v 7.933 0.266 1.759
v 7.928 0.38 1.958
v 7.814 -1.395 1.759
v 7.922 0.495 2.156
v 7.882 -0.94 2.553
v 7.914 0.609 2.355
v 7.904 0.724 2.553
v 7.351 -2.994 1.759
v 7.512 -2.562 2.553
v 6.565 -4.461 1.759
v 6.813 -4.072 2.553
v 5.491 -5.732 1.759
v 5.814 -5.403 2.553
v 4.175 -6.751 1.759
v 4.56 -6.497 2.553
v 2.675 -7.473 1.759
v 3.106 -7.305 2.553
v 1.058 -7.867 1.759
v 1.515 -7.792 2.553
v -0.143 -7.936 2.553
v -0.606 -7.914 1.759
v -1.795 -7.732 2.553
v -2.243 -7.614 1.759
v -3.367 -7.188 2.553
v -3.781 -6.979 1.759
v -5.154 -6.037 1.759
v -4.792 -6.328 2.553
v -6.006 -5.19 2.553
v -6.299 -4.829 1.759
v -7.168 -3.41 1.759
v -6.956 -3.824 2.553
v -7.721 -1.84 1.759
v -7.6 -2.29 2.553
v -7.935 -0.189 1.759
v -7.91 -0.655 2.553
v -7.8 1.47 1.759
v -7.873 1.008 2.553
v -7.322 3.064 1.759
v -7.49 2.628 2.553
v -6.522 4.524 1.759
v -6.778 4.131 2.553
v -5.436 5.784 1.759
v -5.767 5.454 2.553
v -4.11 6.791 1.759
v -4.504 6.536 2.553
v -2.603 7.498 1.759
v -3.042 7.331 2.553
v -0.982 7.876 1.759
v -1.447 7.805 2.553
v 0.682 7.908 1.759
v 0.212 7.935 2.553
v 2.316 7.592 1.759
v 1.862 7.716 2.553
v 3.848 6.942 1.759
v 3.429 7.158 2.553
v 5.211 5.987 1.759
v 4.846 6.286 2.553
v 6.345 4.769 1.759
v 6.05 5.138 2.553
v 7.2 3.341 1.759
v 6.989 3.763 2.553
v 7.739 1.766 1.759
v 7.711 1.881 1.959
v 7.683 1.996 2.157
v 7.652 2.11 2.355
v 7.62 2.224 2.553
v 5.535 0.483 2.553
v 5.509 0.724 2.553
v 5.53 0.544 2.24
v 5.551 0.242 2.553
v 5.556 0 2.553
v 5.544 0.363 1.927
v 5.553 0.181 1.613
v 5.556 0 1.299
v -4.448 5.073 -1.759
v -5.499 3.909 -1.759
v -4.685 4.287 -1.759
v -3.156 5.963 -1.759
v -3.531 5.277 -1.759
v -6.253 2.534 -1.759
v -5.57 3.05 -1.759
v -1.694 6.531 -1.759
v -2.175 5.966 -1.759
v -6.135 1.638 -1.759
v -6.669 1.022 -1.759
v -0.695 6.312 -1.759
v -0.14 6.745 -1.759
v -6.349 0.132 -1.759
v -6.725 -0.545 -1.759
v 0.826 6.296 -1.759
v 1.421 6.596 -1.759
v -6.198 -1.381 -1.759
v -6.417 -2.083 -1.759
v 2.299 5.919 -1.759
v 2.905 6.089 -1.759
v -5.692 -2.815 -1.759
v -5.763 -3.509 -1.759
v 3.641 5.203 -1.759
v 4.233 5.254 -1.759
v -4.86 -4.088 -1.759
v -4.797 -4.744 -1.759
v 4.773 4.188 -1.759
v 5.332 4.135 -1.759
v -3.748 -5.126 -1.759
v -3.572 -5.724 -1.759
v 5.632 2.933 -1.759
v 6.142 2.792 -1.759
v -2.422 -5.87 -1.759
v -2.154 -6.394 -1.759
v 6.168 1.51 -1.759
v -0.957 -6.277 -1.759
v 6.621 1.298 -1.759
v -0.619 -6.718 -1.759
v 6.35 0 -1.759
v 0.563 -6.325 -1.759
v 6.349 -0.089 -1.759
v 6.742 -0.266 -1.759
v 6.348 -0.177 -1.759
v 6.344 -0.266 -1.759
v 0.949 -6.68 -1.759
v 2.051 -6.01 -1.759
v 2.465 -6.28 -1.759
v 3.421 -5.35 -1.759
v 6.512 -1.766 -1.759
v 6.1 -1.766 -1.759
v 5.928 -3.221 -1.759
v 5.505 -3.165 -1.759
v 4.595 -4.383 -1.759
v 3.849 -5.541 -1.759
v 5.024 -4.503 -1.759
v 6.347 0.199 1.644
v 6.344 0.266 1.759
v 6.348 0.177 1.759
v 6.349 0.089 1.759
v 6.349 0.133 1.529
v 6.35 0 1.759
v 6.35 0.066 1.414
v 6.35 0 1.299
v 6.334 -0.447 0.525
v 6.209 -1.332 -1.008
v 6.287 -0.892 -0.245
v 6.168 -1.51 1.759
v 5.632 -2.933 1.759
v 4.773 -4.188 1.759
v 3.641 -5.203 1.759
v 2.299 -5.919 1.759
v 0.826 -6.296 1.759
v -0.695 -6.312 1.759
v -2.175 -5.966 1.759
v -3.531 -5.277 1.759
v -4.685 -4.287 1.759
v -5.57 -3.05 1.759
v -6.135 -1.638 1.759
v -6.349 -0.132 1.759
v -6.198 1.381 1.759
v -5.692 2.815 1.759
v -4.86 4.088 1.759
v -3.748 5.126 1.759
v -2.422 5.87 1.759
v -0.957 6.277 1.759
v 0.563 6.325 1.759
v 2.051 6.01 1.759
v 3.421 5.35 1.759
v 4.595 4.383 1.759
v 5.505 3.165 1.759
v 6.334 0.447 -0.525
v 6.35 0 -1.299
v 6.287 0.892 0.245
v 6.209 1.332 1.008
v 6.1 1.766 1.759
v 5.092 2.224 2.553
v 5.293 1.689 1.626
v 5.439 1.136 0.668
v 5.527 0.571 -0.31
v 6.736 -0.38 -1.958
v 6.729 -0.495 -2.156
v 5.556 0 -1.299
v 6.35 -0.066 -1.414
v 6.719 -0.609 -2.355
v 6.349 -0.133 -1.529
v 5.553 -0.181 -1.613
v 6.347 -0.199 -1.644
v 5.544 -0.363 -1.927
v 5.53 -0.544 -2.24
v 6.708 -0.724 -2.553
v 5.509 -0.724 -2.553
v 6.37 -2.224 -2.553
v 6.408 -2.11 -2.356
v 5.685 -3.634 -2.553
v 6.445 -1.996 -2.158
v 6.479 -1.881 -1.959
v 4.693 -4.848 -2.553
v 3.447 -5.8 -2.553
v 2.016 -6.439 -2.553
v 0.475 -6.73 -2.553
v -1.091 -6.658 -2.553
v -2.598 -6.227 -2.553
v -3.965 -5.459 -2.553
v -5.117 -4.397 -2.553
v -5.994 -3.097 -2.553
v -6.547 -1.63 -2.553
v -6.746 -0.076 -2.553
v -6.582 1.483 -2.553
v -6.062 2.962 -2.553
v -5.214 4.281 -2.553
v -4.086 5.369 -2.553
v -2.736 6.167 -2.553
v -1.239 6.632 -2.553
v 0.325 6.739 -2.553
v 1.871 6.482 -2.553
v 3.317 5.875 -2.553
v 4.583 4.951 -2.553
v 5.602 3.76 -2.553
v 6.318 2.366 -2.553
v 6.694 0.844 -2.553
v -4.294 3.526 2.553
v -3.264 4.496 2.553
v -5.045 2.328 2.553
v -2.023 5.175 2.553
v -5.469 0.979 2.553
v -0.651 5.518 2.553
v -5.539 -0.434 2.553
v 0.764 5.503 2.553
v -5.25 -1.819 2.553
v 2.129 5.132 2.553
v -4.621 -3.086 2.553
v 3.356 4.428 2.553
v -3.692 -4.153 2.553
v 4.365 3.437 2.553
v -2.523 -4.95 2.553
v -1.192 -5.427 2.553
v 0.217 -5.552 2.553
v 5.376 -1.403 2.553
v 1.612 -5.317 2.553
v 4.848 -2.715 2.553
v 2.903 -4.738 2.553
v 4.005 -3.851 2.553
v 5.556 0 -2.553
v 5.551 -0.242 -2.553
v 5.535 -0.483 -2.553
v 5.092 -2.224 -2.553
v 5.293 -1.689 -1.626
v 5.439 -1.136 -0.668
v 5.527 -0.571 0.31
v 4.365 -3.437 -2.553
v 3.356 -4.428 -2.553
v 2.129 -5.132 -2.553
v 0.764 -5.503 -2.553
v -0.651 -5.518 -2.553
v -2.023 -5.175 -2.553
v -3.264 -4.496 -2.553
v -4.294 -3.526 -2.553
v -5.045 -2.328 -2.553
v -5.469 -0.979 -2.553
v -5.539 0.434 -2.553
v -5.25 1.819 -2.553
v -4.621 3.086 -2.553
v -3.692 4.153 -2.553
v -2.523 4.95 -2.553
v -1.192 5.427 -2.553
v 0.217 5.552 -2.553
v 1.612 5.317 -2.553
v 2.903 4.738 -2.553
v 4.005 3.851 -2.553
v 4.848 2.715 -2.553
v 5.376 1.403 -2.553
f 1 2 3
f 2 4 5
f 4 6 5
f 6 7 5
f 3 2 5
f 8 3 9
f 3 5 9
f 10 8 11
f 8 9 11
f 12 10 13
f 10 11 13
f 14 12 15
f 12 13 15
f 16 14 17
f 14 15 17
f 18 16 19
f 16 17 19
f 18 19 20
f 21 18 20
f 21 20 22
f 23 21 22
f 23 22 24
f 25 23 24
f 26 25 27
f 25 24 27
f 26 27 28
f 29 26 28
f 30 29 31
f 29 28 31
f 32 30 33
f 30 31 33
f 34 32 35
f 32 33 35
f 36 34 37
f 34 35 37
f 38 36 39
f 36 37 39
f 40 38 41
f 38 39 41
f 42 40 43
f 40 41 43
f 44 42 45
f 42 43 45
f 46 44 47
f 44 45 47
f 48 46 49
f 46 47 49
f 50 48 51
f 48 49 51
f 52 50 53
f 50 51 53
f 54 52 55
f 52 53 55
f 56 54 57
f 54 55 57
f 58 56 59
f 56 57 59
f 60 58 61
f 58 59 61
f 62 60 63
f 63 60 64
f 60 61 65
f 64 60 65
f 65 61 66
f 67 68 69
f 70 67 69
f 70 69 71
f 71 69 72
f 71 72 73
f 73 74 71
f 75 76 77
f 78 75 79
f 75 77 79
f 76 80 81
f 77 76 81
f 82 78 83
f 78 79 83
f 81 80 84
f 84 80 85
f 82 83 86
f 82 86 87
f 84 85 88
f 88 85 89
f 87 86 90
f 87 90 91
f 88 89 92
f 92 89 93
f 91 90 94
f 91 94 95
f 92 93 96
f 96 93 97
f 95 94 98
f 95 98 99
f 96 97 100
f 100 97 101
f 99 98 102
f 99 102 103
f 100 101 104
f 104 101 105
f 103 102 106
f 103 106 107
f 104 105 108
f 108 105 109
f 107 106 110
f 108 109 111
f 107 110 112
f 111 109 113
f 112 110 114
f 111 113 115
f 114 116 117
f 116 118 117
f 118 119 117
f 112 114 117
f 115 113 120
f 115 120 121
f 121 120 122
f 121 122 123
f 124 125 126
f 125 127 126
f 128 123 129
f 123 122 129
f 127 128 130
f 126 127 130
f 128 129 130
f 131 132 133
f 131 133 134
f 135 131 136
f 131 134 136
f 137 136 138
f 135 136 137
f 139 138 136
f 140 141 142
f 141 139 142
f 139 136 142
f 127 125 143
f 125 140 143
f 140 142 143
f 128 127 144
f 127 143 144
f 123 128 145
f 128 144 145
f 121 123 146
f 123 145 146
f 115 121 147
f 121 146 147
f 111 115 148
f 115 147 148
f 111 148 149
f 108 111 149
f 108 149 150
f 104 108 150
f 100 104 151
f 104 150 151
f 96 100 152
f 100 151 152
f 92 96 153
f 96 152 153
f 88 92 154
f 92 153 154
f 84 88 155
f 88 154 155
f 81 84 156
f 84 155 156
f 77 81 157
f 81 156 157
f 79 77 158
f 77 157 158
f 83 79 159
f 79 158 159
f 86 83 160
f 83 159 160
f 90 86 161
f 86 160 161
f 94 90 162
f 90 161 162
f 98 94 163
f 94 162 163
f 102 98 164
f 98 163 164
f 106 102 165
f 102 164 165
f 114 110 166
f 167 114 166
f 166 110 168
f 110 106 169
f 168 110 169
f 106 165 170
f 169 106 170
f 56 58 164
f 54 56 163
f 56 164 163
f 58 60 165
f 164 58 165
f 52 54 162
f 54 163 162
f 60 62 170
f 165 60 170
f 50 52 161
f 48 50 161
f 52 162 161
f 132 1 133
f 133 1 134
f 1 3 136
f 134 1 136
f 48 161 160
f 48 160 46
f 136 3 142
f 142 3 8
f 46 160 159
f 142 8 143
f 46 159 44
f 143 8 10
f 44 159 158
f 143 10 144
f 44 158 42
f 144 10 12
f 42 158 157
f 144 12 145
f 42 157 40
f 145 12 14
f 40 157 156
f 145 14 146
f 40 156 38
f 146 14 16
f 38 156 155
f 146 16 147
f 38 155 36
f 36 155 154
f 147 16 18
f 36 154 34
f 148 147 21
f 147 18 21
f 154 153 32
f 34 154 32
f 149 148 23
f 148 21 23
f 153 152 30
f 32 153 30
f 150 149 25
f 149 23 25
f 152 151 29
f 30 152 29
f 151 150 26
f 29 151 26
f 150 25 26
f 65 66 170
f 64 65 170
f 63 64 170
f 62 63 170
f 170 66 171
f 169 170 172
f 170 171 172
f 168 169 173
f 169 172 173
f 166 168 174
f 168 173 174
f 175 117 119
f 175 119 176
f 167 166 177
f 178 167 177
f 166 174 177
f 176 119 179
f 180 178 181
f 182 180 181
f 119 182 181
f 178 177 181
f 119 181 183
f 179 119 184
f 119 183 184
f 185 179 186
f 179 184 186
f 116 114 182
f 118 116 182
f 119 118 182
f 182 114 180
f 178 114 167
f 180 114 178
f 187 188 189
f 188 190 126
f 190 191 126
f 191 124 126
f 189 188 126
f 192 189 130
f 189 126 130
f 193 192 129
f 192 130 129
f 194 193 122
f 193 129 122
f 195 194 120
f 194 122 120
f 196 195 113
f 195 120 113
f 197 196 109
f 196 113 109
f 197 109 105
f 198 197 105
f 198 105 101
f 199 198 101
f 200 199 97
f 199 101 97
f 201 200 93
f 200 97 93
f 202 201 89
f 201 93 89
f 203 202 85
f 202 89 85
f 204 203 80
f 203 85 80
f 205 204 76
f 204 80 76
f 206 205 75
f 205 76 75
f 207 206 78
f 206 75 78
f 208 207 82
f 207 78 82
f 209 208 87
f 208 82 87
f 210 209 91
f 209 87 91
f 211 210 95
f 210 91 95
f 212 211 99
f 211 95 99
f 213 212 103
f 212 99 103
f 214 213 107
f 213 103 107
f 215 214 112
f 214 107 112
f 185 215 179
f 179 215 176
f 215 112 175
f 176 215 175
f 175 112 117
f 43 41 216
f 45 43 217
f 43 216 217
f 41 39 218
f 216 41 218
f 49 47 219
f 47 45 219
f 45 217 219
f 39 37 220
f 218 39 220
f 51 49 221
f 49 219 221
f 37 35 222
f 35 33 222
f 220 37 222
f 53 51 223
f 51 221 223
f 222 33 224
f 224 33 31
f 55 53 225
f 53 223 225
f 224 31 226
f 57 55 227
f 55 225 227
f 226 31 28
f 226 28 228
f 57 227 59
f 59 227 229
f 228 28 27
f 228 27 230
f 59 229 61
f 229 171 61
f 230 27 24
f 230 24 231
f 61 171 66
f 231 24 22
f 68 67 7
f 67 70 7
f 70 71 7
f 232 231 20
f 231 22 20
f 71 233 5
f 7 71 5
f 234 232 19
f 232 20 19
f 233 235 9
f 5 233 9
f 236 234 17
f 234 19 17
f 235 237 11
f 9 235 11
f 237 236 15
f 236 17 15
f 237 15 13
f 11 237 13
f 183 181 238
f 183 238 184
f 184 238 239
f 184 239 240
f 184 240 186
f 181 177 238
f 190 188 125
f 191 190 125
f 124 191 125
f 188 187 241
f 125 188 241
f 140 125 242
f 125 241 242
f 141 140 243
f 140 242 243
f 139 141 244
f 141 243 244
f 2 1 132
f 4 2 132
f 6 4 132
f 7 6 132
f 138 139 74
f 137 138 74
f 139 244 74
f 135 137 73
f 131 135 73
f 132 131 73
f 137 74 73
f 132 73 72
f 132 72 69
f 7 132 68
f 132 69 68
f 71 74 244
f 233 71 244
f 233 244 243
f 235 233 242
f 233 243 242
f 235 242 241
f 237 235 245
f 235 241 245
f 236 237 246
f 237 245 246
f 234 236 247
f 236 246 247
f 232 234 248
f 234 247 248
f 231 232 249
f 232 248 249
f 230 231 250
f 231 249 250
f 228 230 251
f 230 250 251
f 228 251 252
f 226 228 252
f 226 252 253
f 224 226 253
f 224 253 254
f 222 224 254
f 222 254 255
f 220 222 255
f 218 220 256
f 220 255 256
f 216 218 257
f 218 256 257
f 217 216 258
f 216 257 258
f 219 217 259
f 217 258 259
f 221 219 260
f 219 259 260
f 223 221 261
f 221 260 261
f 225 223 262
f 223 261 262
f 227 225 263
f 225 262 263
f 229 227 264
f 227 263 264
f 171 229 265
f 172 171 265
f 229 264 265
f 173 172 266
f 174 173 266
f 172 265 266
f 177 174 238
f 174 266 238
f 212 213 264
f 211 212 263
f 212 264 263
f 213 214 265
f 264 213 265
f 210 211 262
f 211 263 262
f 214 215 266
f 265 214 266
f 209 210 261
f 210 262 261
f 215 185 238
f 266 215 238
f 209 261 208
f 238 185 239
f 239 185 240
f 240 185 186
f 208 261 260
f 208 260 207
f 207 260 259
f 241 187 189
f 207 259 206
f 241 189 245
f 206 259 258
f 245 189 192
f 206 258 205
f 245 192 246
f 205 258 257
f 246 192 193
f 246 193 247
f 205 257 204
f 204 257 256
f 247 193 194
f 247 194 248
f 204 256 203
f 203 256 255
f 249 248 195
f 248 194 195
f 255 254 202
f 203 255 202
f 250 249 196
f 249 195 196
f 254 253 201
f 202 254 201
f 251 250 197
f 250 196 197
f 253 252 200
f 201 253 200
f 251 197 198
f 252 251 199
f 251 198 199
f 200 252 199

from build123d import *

# Parameters (mm, degrees)
CUT_EXTRUDE1_DEPTH = 12.511910779


with BuildPart() as part:
    # Sketch1 → Revolve1 (revolve)
    with BuildSketch(Plane(origin=(0, 0, 0), x_dir=(0, 0, -1), z_dir=(1, 0, 0)), mode=Mode.PRIVATE) as revolve1_sk:
        Polygon((-2.5527, 5.55625), (2.5527, 5.55625), (2.5527, 6.746875), (1.75895, 6.746875), (1.75895, 6.35), (-1.75895, 6.35), (-1.75895, 7.9375), (-2.5527, 7.9375), align=None)
    revolve(revolve1_sk.sketch.rotate(Axis((0, 0, 22.513636364), (0, 0, -1)), 90), axis=Axis((0, 0, 22.513636364), (0, 0, -1)))

    # Sketch2 → Cut-Extrude1 (cut, through all)
    with BuildSketch(Plane(origin=(0, 0, 0), x_dir=(0, 0, -1), z_dir=(1, 0, 0))):
        Polygon((-2.5527, 0.723802032), (-2.5527, 2.223802032), (2.5527, -0.723802032), (2.5527, -2.223802032), align=None)
    extrude(amount=CUT_EXTRUDE1_DEPTH, mode=Mode.SUBTRACT)


solid = part.part
